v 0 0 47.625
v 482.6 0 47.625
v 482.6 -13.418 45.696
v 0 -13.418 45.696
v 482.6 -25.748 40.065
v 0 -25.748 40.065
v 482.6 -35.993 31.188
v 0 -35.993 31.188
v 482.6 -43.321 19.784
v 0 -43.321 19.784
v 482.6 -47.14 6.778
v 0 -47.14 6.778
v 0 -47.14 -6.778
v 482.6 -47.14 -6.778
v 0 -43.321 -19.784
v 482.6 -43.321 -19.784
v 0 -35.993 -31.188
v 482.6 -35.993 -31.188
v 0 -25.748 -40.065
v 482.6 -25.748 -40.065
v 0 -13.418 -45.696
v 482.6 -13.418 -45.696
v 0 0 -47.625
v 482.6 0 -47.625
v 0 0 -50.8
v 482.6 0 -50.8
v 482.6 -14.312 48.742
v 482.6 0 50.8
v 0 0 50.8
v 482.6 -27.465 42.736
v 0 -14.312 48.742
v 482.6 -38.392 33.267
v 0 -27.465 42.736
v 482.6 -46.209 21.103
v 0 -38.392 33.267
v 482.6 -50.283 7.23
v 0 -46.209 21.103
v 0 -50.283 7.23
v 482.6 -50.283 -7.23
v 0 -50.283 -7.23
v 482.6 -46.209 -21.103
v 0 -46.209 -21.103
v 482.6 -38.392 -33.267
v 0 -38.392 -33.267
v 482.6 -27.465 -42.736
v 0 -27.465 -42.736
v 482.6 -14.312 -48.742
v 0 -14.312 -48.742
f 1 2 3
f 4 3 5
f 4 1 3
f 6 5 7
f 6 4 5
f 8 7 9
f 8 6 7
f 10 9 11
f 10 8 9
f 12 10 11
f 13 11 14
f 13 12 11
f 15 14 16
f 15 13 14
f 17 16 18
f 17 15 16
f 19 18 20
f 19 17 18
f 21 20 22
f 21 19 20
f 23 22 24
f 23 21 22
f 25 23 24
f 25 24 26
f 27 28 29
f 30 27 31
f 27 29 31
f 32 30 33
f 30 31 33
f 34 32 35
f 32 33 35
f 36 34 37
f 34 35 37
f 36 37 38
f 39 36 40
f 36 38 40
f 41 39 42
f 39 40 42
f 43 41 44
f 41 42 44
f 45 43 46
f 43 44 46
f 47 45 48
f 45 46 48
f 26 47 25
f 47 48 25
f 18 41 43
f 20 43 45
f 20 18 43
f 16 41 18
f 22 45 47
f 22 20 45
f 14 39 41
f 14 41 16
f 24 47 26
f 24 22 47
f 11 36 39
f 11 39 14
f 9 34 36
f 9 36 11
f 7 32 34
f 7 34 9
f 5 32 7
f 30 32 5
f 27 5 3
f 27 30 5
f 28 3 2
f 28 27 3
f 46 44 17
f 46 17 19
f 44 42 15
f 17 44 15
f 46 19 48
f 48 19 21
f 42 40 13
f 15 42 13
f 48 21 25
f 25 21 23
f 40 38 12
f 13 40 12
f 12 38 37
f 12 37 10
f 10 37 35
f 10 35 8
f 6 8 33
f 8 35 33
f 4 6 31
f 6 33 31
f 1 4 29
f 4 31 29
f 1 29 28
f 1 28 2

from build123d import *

# Parameters (mm, degrees)
F0_R      = 50.8
F0_R_2    = 47.625
F1_DEPTH  = 482.6
F4_DEPTH  = 508
F5_W      = 55.5464364588
F5_H      = 92.0769795775
F6_DEPTH  = 508
F7_W      = 106.5891161561
F7_H      = 48.0401627719
F8_DEPTH  = 101.6
F9_W      = 58.4661662579
F9_H      = 32.7058173716
F10_DEPTH = 82.55


# Not quite as in the source:
# - the program builds the solid bodies; features that only make, move or delete a surface that nothing else refers to are left out


with BuildPart() as f1:
    # F0 (on Right) → F1 (new body)
    with BuildSketch(Plane.YZ):
        Circle(F0_R)
        Circle(F0_R_2, mode=Mode.SUBTRACT)
    extrude(amount=F1_DEPTH)

    # F3 (on Right) → F4 (cut)
    with BuildSketch(Plane.YZ):
        Polygon((0, 91.0463854671), (0, 0), (0, -77.0941823721), (61.9923658669, -77.0941823721), (61.9923658669, 91.0463854671), align=None)
    extrude(amount=F4_DEPTH, mode=Mode.SUBTRACT)

    # F5 (on Right) → F6 (cut)
    with BuildSketch(Plane.YZ):
        with Locations((27.7732182294, 46.0384897888)):
            Rectangle(F5_W, F5_H)
    extrude(amount=F6_DEPTH, mode=Mode.SUBTRACT)

    # F7 (on Top) → F8 (cut)
    with BuildSketch(Plane.XY):
        with Locations((53.2945580781, 24.020081386)):
            Rectangle(F7_W, F7_H)
    extrude(amount=F8_DEPTH, mode=Mode.SUBTRACT)

    # F9 (on Top) → F10 (cut)
    with BuildSketch(Plane.XY):
        with Locations((77.5640532374, 16.3529086858)):
            Rectangle(F9_W, F9_H)
    extrude(amount=F10_DEPTH, mode=Mode.SUBTRACT)


solid = f1.part
